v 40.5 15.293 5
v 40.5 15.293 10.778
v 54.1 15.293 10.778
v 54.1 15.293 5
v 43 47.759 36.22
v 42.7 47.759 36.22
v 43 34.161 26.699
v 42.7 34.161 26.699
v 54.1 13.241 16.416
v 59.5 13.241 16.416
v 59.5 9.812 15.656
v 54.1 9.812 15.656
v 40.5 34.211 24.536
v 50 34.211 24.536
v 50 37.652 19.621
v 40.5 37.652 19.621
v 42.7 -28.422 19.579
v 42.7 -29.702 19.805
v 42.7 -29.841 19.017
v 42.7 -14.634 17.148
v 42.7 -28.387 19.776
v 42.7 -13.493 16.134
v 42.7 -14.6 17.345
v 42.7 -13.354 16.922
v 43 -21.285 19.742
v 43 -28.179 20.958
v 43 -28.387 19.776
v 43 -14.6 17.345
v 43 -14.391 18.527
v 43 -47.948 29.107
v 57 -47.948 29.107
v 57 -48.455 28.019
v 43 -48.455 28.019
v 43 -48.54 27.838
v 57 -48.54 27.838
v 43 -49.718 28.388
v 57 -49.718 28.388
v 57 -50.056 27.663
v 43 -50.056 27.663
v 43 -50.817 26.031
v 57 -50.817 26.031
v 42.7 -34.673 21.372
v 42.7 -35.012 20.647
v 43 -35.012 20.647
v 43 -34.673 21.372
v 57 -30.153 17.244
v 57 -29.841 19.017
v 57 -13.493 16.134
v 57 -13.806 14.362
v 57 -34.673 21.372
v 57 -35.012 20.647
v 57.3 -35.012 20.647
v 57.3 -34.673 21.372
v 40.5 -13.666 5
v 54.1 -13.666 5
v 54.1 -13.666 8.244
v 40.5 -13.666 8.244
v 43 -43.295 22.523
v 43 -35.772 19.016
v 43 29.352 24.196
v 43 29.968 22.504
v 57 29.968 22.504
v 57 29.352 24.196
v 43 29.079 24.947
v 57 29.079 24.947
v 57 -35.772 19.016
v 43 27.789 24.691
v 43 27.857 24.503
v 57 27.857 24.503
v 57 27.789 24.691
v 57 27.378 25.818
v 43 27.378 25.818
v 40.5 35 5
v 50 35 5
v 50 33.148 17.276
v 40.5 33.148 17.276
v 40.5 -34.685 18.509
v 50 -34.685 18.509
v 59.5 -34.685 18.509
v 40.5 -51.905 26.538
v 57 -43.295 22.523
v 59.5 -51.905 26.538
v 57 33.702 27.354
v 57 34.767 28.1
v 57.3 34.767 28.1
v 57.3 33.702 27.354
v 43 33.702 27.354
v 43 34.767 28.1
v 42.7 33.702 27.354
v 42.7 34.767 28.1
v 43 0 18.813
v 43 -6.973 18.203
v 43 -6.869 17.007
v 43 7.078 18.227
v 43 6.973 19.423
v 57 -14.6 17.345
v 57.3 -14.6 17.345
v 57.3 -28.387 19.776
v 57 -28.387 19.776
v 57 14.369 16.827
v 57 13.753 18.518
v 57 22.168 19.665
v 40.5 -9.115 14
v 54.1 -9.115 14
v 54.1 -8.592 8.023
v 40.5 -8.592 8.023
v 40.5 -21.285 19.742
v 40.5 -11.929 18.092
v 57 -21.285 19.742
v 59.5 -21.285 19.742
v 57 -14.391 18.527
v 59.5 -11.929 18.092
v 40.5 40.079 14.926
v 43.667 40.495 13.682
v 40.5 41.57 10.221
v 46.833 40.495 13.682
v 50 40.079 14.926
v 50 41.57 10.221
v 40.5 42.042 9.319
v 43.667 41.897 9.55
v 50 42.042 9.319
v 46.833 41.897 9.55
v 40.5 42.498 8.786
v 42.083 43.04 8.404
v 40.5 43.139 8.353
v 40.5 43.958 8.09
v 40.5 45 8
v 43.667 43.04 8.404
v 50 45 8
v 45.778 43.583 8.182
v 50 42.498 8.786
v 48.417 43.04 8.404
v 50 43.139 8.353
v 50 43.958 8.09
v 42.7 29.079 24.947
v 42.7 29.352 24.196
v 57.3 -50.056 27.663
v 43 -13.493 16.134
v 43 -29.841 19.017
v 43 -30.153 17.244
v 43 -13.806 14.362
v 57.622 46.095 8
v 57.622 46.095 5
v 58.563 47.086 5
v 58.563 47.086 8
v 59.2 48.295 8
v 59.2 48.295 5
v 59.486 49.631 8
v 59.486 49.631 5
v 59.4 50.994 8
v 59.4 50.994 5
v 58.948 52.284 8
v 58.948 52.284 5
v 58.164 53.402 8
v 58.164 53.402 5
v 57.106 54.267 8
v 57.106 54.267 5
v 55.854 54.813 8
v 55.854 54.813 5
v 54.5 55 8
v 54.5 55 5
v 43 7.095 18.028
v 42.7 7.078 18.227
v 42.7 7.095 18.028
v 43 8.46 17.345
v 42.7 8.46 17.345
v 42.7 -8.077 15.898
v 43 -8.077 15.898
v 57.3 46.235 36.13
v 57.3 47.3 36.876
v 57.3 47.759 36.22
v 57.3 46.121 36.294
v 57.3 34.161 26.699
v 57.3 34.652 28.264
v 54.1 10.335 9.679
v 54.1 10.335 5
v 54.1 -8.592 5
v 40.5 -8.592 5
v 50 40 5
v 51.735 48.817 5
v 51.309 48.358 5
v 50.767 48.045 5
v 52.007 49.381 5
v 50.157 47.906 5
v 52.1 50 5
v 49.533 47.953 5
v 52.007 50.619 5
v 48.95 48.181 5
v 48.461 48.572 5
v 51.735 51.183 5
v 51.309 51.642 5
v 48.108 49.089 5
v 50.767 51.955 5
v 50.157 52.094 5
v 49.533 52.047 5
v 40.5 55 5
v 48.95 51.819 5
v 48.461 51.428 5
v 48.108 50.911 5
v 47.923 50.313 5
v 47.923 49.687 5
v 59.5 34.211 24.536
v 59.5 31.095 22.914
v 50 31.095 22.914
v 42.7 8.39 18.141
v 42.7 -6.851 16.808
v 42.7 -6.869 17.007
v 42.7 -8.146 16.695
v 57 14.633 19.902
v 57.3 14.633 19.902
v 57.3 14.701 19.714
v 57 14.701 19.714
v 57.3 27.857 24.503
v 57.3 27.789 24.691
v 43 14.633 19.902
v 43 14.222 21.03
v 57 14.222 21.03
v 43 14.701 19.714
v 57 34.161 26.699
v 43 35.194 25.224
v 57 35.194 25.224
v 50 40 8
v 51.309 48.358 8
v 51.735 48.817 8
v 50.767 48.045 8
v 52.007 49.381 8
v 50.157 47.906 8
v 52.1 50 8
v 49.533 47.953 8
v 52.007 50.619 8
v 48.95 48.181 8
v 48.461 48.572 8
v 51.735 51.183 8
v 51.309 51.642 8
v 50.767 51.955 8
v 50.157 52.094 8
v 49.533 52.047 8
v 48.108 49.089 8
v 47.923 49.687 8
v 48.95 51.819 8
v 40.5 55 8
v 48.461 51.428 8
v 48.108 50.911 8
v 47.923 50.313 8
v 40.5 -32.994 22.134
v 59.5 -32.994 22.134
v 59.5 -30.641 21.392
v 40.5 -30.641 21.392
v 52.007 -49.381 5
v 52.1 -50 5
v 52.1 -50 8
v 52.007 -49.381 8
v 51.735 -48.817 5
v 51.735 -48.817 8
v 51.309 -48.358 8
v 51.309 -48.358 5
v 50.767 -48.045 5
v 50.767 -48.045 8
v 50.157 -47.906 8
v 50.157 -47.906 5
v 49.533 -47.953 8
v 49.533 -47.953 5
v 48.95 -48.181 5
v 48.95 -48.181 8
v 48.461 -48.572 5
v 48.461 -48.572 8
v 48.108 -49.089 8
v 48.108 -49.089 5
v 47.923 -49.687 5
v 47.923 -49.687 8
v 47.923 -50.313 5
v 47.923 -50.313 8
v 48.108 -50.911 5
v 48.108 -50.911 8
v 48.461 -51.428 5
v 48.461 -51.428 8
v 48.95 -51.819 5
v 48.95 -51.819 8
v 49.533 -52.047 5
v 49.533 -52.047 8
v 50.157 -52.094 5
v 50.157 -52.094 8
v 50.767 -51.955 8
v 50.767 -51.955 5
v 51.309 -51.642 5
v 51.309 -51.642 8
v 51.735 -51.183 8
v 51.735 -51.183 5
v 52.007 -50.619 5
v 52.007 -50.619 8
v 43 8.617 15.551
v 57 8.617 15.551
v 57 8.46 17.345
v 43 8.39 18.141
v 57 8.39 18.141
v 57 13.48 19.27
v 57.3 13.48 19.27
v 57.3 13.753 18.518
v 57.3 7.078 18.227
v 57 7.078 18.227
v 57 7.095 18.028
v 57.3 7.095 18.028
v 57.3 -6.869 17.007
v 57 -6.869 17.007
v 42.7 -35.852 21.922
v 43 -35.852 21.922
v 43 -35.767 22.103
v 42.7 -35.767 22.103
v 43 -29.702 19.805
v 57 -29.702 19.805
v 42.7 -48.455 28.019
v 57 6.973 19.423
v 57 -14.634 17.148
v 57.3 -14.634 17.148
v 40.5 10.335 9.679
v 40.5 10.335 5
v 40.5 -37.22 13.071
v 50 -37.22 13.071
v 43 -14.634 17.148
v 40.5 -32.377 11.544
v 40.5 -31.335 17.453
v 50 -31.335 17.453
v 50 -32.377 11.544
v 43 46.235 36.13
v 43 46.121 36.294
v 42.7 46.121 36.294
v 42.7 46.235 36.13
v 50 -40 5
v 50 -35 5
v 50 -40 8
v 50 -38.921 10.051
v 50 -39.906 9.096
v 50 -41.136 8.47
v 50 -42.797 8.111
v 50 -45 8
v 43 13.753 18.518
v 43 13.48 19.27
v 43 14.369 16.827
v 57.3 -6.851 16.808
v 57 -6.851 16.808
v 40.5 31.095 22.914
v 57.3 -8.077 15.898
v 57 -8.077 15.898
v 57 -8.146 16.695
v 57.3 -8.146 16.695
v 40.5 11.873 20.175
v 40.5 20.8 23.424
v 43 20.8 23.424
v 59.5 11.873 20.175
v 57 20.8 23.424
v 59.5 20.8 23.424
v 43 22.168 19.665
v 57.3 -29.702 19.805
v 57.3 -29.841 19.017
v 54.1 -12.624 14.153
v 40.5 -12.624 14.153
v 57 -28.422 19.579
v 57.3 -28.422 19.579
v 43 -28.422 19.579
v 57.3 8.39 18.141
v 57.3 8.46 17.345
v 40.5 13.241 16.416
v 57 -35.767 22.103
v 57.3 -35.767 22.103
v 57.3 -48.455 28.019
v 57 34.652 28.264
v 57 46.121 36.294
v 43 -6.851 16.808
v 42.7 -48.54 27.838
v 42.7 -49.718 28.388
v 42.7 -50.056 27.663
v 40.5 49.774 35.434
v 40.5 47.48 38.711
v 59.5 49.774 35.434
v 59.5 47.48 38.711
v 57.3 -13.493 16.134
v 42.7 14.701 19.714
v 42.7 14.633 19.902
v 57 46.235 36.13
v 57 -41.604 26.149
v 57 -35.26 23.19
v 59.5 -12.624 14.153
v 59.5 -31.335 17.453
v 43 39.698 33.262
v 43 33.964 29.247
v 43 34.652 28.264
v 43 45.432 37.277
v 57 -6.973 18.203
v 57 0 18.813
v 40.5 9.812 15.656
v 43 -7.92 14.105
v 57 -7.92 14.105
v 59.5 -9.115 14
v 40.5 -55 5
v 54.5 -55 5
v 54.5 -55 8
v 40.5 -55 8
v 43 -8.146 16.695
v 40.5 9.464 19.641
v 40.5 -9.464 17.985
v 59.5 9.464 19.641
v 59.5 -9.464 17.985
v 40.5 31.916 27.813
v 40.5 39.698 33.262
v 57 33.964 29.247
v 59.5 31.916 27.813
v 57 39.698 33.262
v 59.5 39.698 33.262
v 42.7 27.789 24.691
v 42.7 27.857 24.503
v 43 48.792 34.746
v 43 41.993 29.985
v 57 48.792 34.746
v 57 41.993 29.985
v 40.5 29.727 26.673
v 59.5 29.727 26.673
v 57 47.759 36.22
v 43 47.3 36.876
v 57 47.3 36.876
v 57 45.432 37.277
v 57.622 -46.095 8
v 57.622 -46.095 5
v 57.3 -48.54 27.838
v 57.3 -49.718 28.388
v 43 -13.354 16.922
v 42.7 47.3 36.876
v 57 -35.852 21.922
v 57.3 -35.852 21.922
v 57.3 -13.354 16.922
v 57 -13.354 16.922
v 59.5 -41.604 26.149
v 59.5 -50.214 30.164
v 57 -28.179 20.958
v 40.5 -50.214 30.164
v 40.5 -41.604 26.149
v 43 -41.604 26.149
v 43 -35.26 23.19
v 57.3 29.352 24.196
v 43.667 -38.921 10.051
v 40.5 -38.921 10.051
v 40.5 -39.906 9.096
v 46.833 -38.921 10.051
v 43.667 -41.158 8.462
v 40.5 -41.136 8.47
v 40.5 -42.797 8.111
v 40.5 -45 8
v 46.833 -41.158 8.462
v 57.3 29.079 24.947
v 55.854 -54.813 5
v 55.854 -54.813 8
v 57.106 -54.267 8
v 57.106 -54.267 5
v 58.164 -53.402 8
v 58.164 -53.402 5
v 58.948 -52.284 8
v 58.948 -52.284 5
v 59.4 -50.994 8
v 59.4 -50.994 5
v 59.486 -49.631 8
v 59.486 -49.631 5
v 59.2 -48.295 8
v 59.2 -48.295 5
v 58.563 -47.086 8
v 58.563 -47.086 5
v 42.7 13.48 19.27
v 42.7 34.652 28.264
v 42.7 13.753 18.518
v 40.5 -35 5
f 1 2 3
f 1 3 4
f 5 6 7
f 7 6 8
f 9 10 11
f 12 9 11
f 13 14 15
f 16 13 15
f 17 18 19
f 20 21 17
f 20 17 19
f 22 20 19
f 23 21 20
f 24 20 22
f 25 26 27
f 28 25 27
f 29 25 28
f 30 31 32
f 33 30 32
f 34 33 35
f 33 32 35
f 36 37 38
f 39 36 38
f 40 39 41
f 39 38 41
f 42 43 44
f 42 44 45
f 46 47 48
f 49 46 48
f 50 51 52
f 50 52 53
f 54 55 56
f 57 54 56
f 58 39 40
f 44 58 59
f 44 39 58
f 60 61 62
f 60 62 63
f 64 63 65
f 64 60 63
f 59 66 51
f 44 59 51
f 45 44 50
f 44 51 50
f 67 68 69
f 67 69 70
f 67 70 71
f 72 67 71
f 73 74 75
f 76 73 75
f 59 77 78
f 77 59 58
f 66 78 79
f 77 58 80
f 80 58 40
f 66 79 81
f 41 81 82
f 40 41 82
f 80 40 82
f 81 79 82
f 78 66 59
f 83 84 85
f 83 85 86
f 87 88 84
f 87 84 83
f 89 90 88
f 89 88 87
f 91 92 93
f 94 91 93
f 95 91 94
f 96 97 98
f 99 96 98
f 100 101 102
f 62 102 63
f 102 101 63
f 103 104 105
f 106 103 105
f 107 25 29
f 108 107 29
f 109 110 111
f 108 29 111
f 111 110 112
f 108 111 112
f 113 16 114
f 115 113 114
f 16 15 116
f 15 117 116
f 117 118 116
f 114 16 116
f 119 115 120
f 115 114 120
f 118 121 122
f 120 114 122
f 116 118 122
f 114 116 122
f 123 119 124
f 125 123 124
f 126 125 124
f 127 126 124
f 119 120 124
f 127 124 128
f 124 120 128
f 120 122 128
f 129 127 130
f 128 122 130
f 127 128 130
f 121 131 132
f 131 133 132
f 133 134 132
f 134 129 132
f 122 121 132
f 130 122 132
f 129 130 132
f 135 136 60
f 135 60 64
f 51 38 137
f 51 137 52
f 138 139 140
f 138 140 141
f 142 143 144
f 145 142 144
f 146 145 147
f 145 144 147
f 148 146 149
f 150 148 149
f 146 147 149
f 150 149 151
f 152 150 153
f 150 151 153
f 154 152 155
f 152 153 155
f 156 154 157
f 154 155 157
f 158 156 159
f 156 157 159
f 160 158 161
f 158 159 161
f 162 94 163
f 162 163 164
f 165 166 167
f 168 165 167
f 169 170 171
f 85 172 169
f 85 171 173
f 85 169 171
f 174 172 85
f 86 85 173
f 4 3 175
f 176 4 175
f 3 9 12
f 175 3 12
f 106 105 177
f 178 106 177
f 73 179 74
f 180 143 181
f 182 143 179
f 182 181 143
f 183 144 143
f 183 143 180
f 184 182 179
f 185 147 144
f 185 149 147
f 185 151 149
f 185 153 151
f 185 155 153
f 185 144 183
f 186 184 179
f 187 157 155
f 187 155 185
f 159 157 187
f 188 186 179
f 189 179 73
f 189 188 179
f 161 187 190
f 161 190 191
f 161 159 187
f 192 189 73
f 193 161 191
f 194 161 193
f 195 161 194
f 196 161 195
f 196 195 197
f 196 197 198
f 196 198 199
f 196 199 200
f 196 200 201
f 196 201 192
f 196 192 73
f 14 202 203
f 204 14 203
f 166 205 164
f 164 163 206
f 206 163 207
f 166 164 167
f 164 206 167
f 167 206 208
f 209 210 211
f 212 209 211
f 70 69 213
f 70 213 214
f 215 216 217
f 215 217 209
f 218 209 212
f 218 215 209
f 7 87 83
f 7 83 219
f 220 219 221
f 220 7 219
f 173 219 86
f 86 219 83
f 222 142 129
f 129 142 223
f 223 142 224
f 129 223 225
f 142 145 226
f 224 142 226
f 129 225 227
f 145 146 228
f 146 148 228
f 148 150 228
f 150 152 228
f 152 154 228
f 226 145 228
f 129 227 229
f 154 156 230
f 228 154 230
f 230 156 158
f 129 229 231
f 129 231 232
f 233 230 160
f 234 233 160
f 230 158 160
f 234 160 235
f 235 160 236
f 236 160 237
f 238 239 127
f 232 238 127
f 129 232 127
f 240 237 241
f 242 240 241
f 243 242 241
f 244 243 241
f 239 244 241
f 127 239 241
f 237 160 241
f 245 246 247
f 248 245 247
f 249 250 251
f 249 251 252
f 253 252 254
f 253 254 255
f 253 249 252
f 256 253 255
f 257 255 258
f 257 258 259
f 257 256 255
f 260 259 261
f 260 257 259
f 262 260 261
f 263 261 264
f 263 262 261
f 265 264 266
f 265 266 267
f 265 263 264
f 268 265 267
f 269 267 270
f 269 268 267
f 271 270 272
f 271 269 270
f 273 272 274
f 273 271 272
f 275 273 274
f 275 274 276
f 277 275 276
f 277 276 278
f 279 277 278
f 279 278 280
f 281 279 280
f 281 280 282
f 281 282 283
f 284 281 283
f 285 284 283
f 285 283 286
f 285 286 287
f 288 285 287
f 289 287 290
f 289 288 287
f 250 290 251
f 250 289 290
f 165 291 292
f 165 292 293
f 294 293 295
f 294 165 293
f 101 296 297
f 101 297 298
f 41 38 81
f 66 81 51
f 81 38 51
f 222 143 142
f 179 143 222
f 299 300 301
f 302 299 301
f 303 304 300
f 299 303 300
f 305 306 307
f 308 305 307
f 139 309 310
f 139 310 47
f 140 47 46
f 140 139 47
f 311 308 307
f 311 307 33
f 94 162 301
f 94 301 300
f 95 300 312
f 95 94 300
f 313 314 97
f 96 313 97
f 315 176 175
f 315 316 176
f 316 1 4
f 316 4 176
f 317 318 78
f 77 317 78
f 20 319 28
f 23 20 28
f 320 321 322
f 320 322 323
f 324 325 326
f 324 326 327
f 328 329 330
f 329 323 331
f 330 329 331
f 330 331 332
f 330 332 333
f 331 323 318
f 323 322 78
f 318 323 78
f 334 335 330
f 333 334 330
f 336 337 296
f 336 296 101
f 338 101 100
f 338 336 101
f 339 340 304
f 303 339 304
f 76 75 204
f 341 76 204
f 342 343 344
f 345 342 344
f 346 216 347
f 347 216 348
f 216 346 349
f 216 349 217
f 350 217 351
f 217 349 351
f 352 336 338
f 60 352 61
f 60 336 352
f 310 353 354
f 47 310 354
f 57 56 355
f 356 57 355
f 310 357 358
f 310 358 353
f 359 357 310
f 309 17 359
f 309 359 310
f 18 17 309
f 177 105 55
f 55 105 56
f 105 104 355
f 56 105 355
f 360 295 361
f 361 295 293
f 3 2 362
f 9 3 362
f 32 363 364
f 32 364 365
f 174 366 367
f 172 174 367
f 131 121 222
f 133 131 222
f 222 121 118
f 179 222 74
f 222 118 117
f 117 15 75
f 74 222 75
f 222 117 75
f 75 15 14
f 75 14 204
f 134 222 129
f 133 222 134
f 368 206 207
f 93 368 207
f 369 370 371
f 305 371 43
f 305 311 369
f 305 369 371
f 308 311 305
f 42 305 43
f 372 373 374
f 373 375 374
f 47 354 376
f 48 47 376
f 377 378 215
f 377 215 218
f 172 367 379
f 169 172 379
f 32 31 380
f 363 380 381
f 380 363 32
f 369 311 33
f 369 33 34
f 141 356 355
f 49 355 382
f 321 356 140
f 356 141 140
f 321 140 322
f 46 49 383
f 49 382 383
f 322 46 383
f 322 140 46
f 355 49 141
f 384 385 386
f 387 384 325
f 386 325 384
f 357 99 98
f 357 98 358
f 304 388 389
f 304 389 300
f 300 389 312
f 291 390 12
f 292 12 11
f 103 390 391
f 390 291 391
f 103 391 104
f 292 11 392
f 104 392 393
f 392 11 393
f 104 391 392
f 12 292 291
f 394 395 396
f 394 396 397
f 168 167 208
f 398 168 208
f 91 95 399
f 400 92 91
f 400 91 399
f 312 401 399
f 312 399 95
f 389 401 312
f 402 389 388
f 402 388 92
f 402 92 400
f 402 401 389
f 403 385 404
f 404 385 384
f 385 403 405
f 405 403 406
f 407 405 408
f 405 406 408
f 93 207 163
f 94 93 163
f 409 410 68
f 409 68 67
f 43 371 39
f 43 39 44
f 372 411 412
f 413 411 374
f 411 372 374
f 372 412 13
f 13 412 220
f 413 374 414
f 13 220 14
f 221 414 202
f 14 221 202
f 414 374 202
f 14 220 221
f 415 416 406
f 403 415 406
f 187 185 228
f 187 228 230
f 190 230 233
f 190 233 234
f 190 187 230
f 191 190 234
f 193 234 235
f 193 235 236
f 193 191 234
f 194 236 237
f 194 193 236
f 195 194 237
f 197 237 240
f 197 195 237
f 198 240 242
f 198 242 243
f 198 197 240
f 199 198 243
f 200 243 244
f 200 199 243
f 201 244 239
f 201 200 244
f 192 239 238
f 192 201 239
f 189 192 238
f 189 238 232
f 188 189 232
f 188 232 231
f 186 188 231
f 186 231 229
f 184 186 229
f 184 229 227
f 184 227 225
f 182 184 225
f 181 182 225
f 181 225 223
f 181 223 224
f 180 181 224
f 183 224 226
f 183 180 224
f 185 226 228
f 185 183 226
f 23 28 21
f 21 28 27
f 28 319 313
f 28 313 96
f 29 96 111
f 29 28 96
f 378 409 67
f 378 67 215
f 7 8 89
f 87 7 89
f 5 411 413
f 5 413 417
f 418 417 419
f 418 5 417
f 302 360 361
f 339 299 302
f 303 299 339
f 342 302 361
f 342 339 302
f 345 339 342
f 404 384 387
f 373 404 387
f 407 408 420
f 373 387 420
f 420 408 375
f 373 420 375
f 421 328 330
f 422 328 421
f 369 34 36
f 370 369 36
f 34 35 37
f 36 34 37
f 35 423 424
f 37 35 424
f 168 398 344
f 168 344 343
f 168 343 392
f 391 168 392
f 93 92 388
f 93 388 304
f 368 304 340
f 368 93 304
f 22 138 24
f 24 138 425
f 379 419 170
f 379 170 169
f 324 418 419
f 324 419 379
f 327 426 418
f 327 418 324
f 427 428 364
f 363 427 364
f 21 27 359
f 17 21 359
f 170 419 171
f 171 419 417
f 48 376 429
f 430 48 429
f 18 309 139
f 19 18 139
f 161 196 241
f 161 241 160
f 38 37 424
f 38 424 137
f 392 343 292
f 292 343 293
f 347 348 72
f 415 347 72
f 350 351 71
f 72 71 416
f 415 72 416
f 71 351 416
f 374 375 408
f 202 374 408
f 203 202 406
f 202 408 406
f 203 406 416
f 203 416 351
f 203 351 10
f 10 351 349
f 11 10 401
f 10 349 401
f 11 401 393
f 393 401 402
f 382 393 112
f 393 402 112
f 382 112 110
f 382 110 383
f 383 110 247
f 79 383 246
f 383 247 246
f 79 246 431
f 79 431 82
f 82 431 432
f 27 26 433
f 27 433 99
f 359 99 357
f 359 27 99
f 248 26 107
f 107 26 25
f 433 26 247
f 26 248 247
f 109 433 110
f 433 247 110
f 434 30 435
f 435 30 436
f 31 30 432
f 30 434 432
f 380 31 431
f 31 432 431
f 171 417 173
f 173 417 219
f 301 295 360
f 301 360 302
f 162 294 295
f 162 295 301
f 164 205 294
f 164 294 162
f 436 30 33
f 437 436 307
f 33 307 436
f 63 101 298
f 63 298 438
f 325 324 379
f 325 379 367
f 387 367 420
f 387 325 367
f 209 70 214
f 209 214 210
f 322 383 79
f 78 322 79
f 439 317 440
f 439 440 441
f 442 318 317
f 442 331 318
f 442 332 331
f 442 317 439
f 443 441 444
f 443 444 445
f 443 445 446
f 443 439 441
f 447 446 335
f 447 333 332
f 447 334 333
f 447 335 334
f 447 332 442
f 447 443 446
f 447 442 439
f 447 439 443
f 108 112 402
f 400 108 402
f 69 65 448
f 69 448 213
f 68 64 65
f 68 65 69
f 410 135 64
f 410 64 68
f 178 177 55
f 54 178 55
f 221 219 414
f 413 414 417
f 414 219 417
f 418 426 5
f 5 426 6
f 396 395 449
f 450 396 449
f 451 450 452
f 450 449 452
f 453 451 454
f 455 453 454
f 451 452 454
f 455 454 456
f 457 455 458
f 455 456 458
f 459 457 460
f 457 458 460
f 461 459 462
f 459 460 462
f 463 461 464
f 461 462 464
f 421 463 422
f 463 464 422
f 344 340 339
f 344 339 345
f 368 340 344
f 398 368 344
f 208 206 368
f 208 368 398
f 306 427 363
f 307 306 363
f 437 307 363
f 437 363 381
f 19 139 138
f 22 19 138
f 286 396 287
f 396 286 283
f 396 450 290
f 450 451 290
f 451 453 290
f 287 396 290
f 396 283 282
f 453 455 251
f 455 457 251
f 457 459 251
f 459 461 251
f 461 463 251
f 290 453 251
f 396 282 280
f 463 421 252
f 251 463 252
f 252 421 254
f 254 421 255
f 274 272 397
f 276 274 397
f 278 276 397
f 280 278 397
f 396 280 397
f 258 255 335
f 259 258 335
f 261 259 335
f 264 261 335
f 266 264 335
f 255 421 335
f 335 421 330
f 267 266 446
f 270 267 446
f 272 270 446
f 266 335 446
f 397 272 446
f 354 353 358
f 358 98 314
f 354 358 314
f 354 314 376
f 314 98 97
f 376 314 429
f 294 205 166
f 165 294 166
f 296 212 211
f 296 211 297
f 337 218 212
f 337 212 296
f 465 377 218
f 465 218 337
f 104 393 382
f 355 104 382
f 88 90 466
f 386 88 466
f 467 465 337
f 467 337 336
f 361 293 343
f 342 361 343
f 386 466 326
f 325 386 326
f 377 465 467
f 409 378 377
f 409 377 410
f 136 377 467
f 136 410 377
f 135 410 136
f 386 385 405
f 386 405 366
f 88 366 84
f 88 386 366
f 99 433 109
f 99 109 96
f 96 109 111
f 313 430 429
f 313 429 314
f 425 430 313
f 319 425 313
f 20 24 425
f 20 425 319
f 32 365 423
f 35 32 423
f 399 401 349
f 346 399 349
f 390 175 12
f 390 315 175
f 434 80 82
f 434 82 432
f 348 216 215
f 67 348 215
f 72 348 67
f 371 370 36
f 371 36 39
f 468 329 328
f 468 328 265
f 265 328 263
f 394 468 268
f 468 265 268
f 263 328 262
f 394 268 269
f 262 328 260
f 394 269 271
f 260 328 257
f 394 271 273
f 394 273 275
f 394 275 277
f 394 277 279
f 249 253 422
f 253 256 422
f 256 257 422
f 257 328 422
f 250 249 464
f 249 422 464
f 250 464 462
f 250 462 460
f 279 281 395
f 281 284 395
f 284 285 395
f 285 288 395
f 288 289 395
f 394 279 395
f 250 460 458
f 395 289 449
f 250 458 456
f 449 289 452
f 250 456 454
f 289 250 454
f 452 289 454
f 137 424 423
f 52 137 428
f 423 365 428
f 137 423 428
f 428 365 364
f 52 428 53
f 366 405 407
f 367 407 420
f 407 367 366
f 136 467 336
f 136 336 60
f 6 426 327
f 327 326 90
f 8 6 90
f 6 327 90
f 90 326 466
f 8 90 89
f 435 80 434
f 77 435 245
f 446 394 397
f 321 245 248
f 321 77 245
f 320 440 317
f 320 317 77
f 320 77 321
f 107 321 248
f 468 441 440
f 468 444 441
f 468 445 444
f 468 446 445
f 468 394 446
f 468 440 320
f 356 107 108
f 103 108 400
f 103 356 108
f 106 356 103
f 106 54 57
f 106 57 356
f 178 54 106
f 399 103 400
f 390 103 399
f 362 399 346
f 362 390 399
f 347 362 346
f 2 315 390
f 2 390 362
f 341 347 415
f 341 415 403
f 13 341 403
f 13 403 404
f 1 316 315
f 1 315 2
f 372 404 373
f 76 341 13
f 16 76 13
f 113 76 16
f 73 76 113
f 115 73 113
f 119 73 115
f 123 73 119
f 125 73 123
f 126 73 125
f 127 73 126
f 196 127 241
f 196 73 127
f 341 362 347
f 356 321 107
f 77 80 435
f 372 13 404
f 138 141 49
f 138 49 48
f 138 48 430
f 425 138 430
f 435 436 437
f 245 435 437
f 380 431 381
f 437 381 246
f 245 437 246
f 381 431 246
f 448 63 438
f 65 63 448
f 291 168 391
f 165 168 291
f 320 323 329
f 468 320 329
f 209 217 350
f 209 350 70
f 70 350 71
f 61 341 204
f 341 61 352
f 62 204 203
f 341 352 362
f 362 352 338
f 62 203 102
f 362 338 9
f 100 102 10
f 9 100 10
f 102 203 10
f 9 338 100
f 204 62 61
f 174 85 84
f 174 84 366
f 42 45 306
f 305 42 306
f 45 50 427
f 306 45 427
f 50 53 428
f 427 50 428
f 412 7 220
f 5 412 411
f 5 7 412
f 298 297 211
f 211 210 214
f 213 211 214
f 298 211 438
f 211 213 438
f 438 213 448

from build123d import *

# Parameters (mm, degrees)
PAD008_DEPTH      = 9.5
POCKET004_DEPTH   = 7
POCKET005_DEPTH   = 7.3
PAD009_DEPTH      = 4.1
PAD009_DEPTH_BACK = 9.5
PAD010_DEPTH      = 9.5
SKETCH019_R       = 2.1
PAD011_DEPTH      = 3


with BuildPart() as part:
    # Sketch012 → Pad008 (new body, symmetric)
    with BuildSketch(Plane.YZ):
        Polygon((-50.2140974459, 25.1635701276), (-41.6041734691, 21.1486966411), (-32.9942494922, 17.1338231546), (-30.6406576873, 16.391738509), (-21.2849840337, 14.7420808212), (-11.9293103801, 13.0924231333), (-9.4638496319, 12.9847787924), (0, 13.8127583485), (9.4638496319, 14.6407379046), (11.8731622478, 15.1748696522), (20.8002421453, 18.4240610138), (29.7273220427, 21.6732523754), (31.9162958532, 22.8127600157), (39.698240274, 28.261736161), (47.4801846947, 33.7107123064), (49.7744904401, 30.4341041292), (34.2106015986, 19.5361518385), (31.0954026161, 17.9144818923), (13.2412428211, 11.4160991691), (9.8124726029, 10.6559591122), (-9.1152266609, 9), (-12.6239030908, 9.1531921213), (-31.335250398, 12.4525074969), (-34.6847225392, 13.5085920064), (-51.9045704929, 21.5383389795), align=None)
    extrude(amount=PAD008_DEPTH, both=True)

    # Sketch013 → Pocket004 (cut, symmetric)
    with BuildSketch(Plane.YZ):
        Polygon((45.432304584, 32.2767712155), (39.698240274, 28.261736161), (33.9641759639, 24.2467011065), (34.7671886347, 23.0998922076), (33.7022888371, 22.3542413419), (35.1935840518, 20.2244435621), (41.9925460194, 24.9851279839), (48.791507987, 29.7458124056), (47.3002178304, 31.8756137271), (46.2353203941, 31.1299645148), align=None)
        Polygon((27.3780904908, 20.8182020171), (20.8002421453, 18.4240610138), (14.2223937998, 16.0299200105), (14.701229209, 14.7143529651), (13.4796275966, 14.2697263401), (14.3688739661, 11.826523341), (22.1683227186, 14.6652905307), (29.9677714711, 17.5040577203), (29.078530336, 19.9472626244), (27.8569308195, 19.5026367622), align=None)
        Polygon((-6.9733628866, 13.2026681492), (-6.8513426496, 11.8079957641), (-8.1463884643, 11.6946939366), (-7.9197930232, 9.1045868913), (0.348622971, 9.8279795561), (8.6170389652, 10.5513722209), (8.390436117, 13.1414786182), (7.0953826538, 13.0281761215), (6.9733628866, 14.4228485477), (0, 13.8127583485), align=None)
        Polygon((-21.2849840337, 14.7420808212), (-28.1786383048, 15.9576180648), (-28.4217503954, 14.5788880291), (-29.701997863, 14.8046301996), (-30.1534810944, 12.2441296837), (-21.9795767444, 10.8028498091), (-13.8056723944, 9.3615699345), (-13.3541906242, 11.922070708), (-14.6344528215, 12.1478154758), (-14.3913297626, 13.5265435775), align=None)
        Polygon((-41.6041734691, 21.1486966411), (-47.9483279783, 24.1070244733), (-48.5400033464, 22.838198142), (-49.7182011739, 23.3876008118), (-50.8170011484, 21.0311970654), (-43.294646516, 17.523465493), (-35.7722918836, 14.0157339205), (-34.6734914189, 16.3721374383), (-35.8516963311, 16.9215434118), (-35.2600189598, 18.1903688089), align=None)
    extrude(amount=POCKET004_DEPTH, both=True, mode=Mode.SUBTRACT)

    # Sketch014 → Pocket005 (cut, symmetric)
    with BuildSketch(Plane.YZ):
        Polygon((27.8569308195, 19.5026367622), (27.7885250582, 19.6905746558), (14.6328241506, 14.9022911145), (14.701229209, 14.7143529651), (13.4796275966, 14.2697263401), (13.7532418641, 13.5179715711), (29.3521429929, 19.1955072693), (29.078530336, 19.9472626244), align=None)
        Polygon((7.0779512585, 13.2274150395), (7.0953826538, 13.0281761215), (8.390436117, 13.1414786182), (8.4601600703, 12.3445228037), (-8.0766667901, 10.8977379227), (-8.1463884643, 11.6946939366), (-6.8513426496, 11.8079957641), (-6.8687741121, 12.0072346763), align=None)
        Polygon((34.6524725388, 23.2637220503), (46.1206038498, 31.2937940434), (46.2353203941, 31.1299645148), (47.3002178304, 31.8756137271), (47.7590763401, 31.2202902435), (34.1611489031, 21.6989189481), (33.7022888371, 22.3542413419), (34.7671886347, 23.0998922076), align=None)
        Polygon((-48.5400033464, 22.838198142), (-49.7182011739, 23.3876008118), (-50.0562934738, 22.6625535052), (-35.0115838696, 15.6470902021), (-34.6734914189, 16.3721374383), (-35.8516963311, 16.9215434118), (-35.7671709924, 17.1028041826), (-48.4554782937, 23.0194590466), align=None)
        Polygon((-28.3870200967, 14.7758494628), (-28.4217503954, 14.5788880291), (-29.701997863, 14.8046301996), (-29.8409157804, 14.0167838869), (-13.4931080919, 11.1342243163), (-13.3541906242, 11.922070708), (-14.6344528215, 12.1478154758), (-14.5997209559, 12.3447766332), align=None)
    extrude(amount=POCKET005_DEPTH, both=True, mode=Mode.SUBTRACT)

    # Sketch017 → Pad009 (join, two sides)
    with BuildSketch(Plane.YZ) as pad009_sk:
        Polygon((-13.6657921568, 3.2443456032), (-12.6239030908, 9.1531921213), (-11.9293103801, 13.0924231333), (-9.4638496319, 12.9847787924), (-9.1152266609, 9), (-8.5922922044, 3.0228318115), (-8.5922922044, 0), (-13.6657921568, 0), align=None)
        Polygon((15.2933636811, 0), (10.3354070594, 0), (10.3354070594, 4.6787909237), (9.8124726029, 10.6559591122), (9.4638496319, 14.6407379046), (11.8731622478, 15.1748696522), (13.2412428211, 11.4160991691), (15.2933636811, 5.7779434443), align=None)
    extrude(amount=PAD009_DEPTH)
    extrude(pad009_sk.sketch, amount=-PAD009_DEPTH_BACK)

    # Sketch018 → Pad010 (join)
    with BuildSketch(Plane.YZ):
        with BuildLine():
            Line((-37.2204321096, 8.0707452842), (-34.6847225392, 13.5085920064))
            Line((-34.6847225392, 13.5085920064), (-32.9942494922, 17.1338231546))
            Line((-32.9942494922, 17.1338231546), (-30.6406576873, 16.391738509))
            Line((-30.6406576873, 16.391738509), (-31.335250398, 12.4525074969))
            Line((-31.335250398, 12.4525074969), (-32.377139464, 6.5436609789))
            Line((-32.377139464, 6.5436609789), (-35, 0))
            Line((-35, 0), (-45, 0))
            Line((-45, 0), (-45, 3))
            add(Edge.make_bspline(
                [(-37.2204321096, 8.0707452842), (-39.0096732627, 4.233705249), (-40, 3), (-45, 3)],
                knots=[0, 0, 0, 0, 1, 1, 1, 1], degree=3))
        make_face()
        with BuildLine():
            Line((33.147523476, 12.2763261675), (31.0954026161, 17.9144818923))
            Line((31.0954026161, 17.9144818923), (29.7273220427, 21.6732523754))
            Line((29.7273220427, 21.6732523754), (31.9162958532, 22.8127600157))
            Line((31.9162958532, 22.8127600157), (34.2106015986, 19.5361518385))
            Line((34.2106015986, 19.5361518385), (37.6520602168, 14.6212395727))
            add(Edge.make_bspline(
                [(37.6520602168, 14.6212395727), (42.262119346, 8.0373928164), (40, 3), (45, 3)],
                knots=[0, 0, 0, 0, 1, 1, 1, 1], degree=3))
            Line((45, 3), (45, 0))
            Line((45, 0), (35, 0))
            Line((35, 0), (33.147523476, 12.2763261675))
        make_face()
    extrude(amount=-PAD010_DEPTH)

    # Sketch019 → Pad011 (join)
    with BuildSketch(Plane.XY):
        with BuildLine():
            Line((7.6224992299, 46.0948753465), (0, 40))
            Line((0, 40), (0, 45))
            Line((0, 45), (-9.5, 45))
            Line((-9.5, 45), (-9.5, 55))
            Line((-9.5, 55), (4.5, 55))
            ThreePointArc((7.6224992299, 46.0948753465), (9.218348401, 51.6544450327), (4.5, 55))
        make_face()
        with Locations((0, 50)):
            Circle(SKETCH019_R, mode=Mode.SUBTRACT)
        with BuildLine():
            Line((0, -45), (0, -40))
            Line((0, -40), (7.6224992299, -46.0948753465))
            ThreePointArc((4.5, -55), (9.218348401, -51.6544450327), (7.6224992299, -46.0948753465))
            Line((4.5, -55), (-9.5, -55))
            Line((-9.5, -55), (-9.5, -45))
            Line((-9.5, -45), (0, -45))
        make_face()
        with Locations((0, -50)):
            Circle(SKETCH019_R, mode=Mode.SUBTRACT)
    extrude(amount=PAD011_DEPTH)


with BuildPart() as part_1:
    # Body002 placement: moved
    add(part.part.moved(Location((50, 0, 5))))


solid = part_1.part
